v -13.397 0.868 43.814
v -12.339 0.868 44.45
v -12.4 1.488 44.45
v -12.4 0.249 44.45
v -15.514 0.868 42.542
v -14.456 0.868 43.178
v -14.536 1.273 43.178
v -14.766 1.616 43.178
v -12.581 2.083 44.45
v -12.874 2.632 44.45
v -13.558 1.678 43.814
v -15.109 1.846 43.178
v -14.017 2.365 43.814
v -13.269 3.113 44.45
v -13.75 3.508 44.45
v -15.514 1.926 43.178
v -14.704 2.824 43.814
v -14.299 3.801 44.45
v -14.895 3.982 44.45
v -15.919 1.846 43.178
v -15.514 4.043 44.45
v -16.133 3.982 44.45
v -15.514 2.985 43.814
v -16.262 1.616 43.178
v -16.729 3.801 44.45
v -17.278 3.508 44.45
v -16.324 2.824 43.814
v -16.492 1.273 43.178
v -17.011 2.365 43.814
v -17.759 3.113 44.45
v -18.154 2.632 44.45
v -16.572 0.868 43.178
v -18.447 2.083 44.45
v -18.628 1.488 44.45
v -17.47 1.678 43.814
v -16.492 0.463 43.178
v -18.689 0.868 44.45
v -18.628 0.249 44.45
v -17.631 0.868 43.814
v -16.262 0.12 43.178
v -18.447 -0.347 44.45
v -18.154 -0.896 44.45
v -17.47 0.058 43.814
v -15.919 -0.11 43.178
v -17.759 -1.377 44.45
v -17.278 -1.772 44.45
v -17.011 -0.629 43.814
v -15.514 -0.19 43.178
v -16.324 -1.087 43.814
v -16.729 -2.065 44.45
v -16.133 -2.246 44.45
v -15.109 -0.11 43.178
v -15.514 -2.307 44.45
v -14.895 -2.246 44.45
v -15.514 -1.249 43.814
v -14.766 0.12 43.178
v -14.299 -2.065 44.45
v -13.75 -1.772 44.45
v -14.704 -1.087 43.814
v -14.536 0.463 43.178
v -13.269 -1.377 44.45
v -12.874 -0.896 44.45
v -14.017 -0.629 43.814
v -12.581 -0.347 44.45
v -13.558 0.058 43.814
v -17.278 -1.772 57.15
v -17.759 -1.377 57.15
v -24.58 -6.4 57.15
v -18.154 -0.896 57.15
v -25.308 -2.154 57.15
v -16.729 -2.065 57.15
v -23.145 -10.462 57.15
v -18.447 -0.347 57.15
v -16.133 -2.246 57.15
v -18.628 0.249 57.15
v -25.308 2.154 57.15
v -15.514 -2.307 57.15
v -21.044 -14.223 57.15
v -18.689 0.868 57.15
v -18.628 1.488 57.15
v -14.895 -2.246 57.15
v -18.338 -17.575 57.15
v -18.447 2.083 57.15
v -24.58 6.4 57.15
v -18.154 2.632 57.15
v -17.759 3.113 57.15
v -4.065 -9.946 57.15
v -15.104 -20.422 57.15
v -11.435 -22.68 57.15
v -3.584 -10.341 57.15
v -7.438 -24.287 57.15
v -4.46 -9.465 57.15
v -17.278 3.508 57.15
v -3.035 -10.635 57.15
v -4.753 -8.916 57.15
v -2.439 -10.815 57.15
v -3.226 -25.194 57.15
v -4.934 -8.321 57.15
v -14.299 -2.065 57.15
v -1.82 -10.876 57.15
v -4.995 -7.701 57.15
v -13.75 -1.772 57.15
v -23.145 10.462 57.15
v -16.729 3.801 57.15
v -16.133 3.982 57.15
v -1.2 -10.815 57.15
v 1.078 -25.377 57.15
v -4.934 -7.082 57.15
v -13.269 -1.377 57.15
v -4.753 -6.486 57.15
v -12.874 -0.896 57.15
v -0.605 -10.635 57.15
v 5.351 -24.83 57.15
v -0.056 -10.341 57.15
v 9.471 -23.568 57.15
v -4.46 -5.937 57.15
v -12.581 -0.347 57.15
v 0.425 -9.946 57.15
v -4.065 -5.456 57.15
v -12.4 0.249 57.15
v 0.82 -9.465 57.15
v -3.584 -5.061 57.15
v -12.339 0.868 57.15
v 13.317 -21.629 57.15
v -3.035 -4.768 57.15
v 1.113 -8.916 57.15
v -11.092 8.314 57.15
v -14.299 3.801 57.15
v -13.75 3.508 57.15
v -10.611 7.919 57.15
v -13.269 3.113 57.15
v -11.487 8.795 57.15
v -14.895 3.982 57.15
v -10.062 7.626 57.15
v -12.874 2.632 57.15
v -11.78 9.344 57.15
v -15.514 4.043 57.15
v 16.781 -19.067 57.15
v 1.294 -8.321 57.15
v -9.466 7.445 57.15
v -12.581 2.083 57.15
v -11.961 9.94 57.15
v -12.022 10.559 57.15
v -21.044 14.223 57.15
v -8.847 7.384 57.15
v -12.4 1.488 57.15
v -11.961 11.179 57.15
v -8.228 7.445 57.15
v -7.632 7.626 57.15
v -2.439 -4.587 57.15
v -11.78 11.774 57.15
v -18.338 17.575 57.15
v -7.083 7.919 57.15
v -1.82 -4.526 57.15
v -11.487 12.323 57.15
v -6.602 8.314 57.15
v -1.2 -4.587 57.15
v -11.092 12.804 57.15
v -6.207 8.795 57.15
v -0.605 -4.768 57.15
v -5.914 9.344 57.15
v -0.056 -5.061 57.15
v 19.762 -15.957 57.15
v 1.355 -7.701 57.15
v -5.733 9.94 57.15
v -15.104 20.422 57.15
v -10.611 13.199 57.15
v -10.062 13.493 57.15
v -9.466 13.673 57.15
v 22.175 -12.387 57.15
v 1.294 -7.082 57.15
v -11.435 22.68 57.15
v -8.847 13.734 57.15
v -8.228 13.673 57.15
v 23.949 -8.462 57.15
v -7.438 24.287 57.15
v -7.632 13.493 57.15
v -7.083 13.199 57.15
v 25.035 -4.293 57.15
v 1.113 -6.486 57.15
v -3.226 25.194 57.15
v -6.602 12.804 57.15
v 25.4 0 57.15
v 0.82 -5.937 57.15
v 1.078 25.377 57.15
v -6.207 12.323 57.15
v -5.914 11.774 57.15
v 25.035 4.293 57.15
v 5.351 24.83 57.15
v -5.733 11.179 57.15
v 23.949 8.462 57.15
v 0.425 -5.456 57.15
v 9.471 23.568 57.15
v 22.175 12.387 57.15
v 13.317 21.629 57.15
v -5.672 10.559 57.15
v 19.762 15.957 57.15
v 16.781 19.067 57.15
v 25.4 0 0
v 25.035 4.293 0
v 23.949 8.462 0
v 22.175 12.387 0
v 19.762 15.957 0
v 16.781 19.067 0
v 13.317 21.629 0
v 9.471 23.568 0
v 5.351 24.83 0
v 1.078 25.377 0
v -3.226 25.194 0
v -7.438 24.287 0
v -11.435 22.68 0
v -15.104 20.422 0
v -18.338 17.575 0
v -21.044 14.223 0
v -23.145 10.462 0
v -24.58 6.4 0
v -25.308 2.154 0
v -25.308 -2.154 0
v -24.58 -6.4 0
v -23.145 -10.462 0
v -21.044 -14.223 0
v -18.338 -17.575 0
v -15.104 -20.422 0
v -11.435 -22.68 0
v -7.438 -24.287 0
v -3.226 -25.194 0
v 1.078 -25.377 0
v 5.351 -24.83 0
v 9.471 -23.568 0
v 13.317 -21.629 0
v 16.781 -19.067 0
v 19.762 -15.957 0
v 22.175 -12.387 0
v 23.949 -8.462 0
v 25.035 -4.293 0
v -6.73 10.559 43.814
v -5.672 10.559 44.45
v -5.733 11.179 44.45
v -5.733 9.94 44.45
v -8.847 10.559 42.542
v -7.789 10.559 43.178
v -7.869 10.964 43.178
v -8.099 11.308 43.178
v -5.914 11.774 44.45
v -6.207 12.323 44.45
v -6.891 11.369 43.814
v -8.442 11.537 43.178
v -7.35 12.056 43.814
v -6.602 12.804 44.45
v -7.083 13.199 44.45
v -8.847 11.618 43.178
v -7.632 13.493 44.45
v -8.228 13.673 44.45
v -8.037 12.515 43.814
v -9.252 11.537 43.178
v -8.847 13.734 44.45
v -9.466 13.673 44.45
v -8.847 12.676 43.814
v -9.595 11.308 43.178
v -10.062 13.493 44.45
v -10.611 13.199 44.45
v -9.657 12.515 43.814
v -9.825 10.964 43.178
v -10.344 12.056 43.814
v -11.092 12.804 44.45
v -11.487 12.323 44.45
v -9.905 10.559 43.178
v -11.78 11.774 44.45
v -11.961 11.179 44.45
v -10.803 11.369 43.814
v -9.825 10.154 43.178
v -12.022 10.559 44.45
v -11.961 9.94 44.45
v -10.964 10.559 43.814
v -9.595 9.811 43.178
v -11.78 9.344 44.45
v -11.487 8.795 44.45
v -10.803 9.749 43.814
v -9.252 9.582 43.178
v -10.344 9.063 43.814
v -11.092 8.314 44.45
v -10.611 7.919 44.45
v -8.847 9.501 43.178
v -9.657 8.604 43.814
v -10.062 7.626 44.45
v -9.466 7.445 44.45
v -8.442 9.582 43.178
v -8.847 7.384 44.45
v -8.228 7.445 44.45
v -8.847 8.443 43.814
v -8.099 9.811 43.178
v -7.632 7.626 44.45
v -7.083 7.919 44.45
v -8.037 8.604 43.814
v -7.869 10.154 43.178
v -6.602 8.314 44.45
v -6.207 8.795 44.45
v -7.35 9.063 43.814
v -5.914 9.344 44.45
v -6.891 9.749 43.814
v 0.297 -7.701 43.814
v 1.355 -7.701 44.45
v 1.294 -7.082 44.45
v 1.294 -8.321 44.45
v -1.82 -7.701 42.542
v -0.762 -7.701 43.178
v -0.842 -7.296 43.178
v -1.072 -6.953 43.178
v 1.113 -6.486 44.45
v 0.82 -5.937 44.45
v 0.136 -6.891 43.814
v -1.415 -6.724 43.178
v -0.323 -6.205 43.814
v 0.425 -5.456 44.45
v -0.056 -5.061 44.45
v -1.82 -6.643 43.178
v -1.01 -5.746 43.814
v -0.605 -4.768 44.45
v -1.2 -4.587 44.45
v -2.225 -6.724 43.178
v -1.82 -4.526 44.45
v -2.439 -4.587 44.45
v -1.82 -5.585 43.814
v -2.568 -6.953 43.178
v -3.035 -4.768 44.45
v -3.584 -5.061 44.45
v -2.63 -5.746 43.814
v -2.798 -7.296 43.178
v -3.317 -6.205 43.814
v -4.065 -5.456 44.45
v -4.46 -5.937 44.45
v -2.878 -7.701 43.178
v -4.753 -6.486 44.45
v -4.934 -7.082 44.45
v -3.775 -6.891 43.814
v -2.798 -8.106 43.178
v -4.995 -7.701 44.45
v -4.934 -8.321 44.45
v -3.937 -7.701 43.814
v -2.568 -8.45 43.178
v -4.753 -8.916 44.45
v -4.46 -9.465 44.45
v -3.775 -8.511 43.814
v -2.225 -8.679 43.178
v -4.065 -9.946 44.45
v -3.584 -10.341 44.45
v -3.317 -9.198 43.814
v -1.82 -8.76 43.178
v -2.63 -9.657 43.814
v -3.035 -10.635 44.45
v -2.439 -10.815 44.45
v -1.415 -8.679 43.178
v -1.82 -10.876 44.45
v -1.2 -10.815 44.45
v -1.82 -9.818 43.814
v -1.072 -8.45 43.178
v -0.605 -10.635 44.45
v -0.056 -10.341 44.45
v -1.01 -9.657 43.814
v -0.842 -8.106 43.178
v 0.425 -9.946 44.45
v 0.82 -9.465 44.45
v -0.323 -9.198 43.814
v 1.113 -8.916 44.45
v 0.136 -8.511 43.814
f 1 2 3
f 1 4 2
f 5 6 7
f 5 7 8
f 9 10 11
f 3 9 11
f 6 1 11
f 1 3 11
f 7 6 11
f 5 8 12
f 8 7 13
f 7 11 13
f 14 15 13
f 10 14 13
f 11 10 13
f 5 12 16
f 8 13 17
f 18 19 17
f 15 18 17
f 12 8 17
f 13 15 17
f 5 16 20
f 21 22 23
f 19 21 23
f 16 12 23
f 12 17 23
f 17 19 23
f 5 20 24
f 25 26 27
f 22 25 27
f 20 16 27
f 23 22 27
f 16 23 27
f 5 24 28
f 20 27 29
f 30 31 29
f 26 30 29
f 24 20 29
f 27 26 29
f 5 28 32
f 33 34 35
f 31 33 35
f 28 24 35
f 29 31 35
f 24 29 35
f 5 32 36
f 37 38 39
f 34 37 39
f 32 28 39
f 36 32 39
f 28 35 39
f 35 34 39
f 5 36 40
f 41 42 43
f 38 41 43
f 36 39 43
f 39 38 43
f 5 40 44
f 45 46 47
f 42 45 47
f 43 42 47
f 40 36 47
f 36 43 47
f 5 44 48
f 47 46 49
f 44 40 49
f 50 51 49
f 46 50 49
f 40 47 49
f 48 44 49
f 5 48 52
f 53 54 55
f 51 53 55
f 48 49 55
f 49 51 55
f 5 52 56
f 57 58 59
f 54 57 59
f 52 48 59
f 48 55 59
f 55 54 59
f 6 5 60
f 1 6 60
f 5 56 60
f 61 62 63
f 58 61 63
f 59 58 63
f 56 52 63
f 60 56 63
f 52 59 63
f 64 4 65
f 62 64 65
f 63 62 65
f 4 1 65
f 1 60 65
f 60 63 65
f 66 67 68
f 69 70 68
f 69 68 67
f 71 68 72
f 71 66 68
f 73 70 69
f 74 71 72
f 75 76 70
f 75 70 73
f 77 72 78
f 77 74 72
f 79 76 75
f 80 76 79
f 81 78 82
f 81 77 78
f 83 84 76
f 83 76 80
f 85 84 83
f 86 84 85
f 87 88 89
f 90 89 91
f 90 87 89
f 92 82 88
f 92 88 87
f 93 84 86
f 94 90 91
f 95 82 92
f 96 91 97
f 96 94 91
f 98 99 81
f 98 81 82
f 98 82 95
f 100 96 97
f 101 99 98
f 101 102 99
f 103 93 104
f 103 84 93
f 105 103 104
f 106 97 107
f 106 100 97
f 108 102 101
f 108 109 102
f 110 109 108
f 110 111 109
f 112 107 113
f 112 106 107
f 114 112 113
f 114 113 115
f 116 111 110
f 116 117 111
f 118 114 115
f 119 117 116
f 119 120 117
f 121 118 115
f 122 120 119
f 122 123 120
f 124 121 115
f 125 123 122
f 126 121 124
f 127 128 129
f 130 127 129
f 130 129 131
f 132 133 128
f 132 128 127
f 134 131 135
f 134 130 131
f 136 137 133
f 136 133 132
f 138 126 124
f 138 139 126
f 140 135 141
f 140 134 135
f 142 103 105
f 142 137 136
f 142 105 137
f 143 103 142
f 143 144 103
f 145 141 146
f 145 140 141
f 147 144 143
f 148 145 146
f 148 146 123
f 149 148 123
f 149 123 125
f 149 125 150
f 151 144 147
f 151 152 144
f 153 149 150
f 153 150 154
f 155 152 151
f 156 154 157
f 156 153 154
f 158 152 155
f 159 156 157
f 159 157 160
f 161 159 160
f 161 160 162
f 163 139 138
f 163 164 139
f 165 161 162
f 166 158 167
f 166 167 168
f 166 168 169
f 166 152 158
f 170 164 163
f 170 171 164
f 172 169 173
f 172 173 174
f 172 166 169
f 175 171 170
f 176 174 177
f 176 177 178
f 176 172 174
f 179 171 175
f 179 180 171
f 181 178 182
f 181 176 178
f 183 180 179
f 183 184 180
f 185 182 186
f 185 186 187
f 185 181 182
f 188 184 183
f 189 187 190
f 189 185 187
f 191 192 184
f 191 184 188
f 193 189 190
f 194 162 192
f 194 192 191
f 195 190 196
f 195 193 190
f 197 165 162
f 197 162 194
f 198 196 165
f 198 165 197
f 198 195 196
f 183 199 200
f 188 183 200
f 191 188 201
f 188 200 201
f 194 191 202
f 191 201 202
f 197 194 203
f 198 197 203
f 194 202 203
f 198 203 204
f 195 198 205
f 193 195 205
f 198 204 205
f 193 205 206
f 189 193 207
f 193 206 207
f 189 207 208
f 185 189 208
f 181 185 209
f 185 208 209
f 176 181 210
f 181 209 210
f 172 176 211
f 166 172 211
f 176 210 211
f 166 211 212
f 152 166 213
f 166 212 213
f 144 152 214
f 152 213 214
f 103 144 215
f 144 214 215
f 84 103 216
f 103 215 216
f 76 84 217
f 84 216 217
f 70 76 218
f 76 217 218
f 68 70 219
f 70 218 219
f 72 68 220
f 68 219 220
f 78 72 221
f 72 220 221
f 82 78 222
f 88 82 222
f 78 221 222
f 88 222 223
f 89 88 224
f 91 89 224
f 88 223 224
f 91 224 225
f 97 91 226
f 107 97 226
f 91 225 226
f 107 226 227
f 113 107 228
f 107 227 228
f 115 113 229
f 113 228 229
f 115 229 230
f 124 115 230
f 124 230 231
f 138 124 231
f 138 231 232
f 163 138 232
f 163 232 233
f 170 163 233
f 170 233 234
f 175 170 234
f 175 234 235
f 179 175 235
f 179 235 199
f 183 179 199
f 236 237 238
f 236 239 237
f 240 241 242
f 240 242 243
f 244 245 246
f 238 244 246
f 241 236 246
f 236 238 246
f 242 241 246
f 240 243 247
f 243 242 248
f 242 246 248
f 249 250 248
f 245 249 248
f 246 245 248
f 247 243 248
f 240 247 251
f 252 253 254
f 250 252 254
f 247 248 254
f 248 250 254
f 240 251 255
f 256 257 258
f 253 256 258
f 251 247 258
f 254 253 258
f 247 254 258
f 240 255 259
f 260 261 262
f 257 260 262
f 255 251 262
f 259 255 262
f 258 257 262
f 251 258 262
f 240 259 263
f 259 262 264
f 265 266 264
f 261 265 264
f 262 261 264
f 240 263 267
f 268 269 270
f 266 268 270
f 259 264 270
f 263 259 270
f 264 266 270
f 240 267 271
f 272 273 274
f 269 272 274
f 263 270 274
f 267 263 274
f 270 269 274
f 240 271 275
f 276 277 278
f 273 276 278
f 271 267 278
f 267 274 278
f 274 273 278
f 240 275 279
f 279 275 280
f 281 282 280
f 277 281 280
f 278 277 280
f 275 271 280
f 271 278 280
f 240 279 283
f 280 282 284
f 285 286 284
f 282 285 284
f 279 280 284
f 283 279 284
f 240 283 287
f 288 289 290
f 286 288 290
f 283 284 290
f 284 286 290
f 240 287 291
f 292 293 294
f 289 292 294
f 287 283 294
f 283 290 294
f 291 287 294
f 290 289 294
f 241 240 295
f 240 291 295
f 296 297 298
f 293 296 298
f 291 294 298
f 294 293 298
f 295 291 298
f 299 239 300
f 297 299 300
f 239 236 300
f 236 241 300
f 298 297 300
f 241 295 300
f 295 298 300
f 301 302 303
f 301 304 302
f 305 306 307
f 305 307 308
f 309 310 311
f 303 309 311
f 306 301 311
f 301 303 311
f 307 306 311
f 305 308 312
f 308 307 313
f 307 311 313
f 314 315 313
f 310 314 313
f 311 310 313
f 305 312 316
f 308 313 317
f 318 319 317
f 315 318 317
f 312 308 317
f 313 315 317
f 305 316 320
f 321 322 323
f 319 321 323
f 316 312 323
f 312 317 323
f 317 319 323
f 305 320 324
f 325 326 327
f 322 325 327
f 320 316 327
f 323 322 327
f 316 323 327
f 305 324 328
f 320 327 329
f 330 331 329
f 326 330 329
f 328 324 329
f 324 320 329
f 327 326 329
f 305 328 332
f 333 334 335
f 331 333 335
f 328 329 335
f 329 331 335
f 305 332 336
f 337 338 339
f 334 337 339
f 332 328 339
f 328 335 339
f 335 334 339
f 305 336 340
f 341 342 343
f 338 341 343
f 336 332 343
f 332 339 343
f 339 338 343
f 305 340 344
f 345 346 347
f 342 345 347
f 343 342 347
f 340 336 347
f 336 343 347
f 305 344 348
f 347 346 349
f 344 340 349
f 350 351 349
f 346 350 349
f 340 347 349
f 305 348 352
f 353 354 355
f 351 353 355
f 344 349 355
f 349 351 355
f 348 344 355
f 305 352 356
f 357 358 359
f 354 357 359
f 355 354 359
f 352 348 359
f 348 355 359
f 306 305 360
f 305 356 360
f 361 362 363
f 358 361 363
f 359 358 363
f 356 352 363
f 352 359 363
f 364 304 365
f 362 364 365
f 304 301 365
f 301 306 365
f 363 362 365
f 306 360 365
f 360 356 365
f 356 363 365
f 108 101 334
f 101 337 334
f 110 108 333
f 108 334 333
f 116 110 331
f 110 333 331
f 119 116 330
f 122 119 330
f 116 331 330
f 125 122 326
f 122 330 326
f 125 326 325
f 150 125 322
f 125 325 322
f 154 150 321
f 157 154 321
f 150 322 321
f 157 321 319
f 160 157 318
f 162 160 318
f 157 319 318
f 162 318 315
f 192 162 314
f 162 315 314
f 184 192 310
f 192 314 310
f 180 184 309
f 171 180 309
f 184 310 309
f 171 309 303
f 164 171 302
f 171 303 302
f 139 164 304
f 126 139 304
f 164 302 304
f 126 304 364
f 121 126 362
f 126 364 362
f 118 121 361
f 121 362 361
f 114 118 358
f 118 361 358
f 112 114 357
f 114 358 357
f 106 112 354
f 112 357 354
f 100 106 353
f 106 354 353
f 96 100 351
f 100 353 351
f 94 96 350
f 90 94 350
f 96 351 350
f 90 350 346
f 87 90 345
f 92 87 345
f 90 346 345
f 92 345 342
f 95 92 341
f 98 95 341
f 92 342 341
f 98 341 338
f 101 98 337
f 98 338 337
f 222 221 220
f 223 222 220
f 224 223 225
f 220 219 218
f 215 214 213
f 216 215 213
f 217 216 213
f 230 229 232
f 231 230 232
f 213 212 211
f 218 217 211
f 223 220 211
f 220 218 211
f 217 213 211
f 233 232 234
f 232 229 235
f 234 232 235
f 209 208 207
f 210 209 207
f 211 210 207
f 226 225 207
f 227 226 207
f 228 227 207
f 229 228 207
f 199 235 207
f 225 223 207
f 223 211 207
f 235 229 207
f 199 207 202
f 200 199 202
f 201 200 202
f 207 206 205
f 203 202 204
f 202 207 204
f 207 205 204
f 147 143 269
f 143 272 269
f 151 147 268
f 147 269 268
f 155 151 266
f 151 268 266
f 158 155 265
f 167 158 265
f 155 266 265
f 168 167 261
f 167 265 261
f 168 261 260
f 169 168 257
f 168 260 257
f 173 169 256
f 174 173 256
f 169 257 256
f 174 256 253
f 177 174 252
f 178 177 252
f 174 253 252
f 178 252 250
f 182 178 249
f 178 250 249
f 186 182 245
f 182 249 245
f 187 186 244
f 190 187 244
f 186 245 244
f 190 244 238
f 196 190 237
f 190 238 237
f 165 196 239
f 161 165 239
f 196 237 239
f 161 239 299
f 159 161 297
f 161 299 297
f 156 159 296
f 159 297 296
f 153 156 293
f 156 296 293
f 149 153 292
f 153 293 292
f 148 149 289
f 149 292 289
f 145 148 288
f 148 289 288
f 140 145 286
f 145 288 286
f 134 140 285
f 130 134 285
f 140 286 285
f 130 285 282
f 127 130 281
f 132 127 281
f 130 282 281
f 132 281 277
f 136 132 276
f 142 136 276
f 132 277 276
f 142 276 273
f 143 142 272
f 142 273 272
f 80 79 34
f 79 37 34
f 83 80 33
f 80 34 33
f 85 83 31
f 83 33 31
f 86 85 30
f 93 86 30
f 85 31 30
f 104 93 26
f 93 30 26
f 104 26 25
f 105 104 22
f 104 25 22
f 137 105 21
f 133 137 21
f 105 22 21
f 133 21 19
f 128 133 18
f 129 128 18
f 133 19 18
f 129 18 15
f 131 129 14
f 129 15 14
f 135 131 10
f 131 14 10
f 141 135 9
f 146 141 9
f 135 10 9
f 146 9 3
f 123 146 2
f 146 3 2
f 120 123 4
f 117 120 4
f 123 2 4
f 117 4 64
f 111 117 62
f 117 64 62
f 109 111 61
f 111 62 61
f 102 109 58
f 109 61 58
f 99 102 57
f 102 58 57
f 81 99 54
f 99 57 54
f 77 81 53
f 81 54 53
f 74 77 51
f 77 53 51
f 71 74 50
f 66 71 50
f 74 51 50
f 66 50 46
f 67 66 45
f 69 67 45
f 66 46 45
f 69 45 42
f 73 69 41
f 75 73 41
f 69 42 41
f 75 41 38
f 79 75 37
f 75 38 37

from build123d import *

# Parameters (mm, degrees)
F0_R     = 25.4
F2_DEPTH = 57.15
F4_D     = 6.35
F4_DEPTH = 12.7
F4_TIP   = 1.9077324654


with BuildPart() as f2:
    # F0 (on Top) → F2 (new body, through all)
    with BuildSketch(Plane.XY):
        Circle(F0_R)
    extrude(amount=F2_DEPTH)

    # F4
    with Locations(Plane.XY.offset(57.15)):
        with Locations((-8.8469870389, 10.5592897162), (-15.5139854178, 0.8681075997), (-1.8198583275, -7.7013894916)):
            Hole(F4_D / 2, depth=F4_DEPTH)
            with Locations((0, 0, -(F4_DEPTH + F4_TIP / 2))):  # 118° drill point
                Cone(0, F4_D / 2, F4_TIP, mode=Mode.SUBTRACT)


solid = f2.part
